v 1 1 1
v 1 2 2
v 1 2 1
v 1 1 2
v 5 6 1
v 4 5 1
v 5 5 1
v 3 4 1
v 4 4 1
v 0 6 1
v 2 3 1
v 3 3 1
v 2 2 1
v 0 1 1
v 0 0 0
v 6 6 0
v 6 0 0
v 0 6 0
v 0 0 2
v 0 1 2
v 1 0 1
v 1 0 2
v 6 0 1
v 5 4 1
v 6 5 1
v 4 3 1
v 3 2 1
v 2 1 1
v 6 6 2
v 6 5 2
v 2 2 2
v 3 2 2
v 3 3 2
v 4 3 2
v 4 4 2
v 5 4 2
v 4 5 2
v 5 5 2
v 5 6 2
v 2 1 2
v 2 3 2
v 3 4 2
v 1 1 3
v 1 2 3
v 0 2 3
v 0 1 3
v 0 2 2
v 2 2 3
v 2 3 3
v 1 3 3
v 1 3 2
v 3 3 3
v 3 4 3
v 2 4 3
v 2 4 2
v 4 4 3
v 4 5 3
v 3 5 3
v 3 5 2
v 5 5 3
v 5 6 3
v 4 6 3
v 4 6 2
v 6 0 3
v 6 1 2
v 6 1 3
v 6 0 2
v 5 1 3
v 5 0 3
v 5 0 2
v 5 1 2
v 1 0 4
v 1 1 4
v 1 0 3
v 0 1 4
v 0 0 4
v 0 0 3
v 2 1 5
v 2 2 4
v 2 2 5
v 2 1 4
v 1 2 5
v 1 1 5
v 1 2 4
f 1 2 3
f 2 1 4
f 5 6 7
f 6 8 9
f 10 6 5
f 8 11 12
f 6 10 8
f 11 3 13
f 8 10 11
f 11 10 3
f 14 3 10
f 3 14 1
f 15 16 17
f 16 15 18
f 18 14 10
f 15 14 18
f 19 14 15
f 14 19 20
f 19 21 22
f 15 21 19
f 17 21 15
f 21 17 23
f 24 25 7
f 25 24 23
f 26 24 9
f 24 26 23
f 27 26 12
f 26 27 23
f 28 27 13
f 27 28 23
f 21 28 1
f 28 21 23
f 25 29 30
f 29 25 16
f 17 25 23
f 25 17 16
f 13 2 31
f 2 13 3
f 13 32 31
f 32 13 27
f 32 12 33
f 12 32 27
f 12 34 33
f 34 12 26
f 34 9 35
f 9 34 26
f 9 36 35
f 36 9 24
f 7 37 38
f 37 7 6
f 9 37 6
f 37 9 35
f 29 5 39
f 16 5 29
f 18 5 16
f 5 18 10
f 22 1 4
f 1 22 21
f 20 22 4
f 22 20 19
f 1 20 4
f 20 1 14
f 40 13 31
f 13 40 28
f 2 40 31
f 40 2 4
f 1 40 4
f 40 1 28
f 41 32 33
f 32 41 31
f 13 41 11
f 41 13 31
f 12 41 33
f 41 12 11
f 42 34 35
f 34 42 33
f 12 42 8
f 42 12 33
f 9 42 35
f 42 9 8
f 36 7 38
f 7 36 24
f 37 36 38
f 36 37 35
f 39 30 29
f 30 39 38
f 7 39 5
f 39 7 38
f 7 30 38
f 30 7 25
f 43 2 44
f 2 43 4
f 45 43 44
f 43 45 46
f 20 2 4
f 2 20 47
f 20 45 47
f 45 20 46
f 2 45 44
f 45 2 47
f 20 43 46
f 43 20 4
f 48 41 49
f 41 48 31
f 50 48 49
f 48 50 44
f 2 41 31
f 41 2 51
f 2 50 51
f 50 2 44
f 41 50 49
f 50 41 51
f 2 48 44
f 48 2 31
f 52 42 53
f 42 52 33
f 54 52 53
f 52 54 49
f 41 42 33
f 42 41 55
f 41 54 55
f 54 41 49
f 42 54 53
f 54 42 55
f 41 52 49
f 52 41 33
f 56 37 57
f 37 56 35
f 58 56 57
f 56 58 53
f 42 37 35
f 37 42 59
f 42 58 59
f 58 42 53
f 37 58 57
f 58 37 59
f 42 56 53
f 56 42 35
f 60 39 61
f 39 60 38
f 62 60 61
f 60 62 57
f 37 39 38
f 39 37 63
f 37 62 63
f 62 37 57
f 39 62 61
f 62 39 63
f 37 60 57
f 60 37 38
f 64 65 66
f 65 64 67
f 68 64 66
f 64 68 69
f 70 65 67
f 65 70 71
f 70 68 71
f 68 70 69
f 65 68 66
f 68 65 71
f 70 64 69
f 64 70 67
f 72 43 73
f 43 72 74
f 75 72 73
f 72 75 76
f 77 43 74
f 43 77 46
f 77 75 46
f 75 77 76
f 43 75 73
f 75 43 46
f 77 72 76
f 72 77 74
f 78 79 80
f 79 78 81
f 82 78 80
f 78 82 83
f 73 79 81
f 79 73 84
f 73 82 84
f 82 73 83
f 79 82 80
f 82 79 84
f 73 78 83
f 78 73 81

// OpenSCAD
union() {
    translate([0.0, 0.0, 0.0]) cube([1, 1, 1]);
    translate([1.0, 0.0, 0.0]) cube([1, 1, 1]);
    translate([2.0, 0.0, 0.0]) cube([1, 1, 1]);
    translate([3.0, 0.0, 0.0]) cube([1, 1, 1]);
    translate([4.0, 0.0, 0.0]) cube([1, 1, 1]);
    translate([5.0, 0.0, 0.0]) cube([1, 1, 1]);
    translate([0.0, 1.0, 0.0]) cube([1, 1, 1]);
    translate([1.0, 1.0, 0.0]) cube([1, 1, 1]);
    translate([2.0, 1.0, 0.0]) cube([1, 1, 1]);
    translate([3.0, 1.0, 0.0]) cube([1, 1, 1]);
    translate([4.0, 1.0, 0.0]) cube([1, 1, 1]);
    translate([5.0, 1.0, 0.0]) cube([1, 1, 1]);
    translate([0.0, 2.0, 0.0]) cube([1, 1, 1]);
    translate([1.0, 2.0, 0.0]) cube([1, 1, 1]);
    translate([2.0, 2.0, 0.0]) cube([1, 1, 1]);
    translate([3.0, 2.0, 0.0]) cube([1, 1, 1]);
    translate([4.0, 2.0, 0.0]) cube([1, 1, 1]);
    translate([5.0, 2.0, 0.0]) cube([1, 1, 1]);
    translate([0.0, 3.0, 0.0]) cube([1, 1, 1]);
    translate([1.0, 3.0, 0.0]) cube([1, 1, 1]);
    translate([2.0, 3.0, 0.0]) cube([1, 1, 1]);
    translate([3.0, 3.0, 0.0]) cube([1, 1, 1]);
    translate([4.0, 3.0, 0.0]) cube([1, 1, 1]);
    translate([5.0, 3.0, 0.0]) cube([1, 1, 1]);
    translate([0.0, 4.0, 0.0]) cube([1, 1, 1]);
    translate([1.0, 4.0, 0.0]) cube([1, 1, 1]);
    translate([2.0, 4.0, 0.0]) cube([1, 1, 1]);
    translate([3.0, 4.0, 0.0]) cube([1, 1, 1]);
    translate([4.0, 4.0, 0.0]) cube([1, 1, 1]);
    translate([5.0, 4.0, 0.0]) cube([1, 1, 1]);
    translate([0.0, 5.0, 0.0]) cube([1, 1, 1]);
    translate([1.0, 5.0, 0.0]) cube([1, 1, 1]);
    translate([2.0, 5.0, 0.0]) cube([1, 1, 1]);
    translate([3.0, 5.0, 0.0]) cube([1, 1, 1]);
    translate([4.0, 5.0, 0.0]) cube([1, 1, 1]);
    translate([5.0, 5.0, 0.0]) cube([1, 1, 1]);
    translate([0.0, 0.0, 1.0]) cube([1, 1, 1]);
    translate([1.0, 1.0, 1.0]) cube([1, 1, 1]);
    translate([2.0, 2.0, 1.0]) cube([1, 1, 1]);
    translate([3.0, 3.0, 1.0]) cube([1, 1, 1]);
    translate([4.0, 4.0, 1.0]) cube([1, 1, 1]);
    translate([5.0, 5.0, 1.0]) cube([1, 1, 1]);
    translate([0.0, 1.0, 2.0]) cube([1, 1, 1]);
    translate([1.0, 2.0, 2.0]) cube([1, 1, 1]);
    translate([2.0, 3.0, 2.0]) cube([1, 1, 1]);
    translate([3.0, 4.0, 2.0]) cube([1, 1, 1]);
    translate([4.0, 5.0, 2.0]) cube([1, 1, 1]);
    translate([5.0, 0.0, 2.0]) cube([1, 1, 1]);
    translate([0.0, 0.0, 3.0]) cube([1, 1, 1]);
    translate([1.0, 1.0, 4.0]) cube([1, 1, 1]);
}
